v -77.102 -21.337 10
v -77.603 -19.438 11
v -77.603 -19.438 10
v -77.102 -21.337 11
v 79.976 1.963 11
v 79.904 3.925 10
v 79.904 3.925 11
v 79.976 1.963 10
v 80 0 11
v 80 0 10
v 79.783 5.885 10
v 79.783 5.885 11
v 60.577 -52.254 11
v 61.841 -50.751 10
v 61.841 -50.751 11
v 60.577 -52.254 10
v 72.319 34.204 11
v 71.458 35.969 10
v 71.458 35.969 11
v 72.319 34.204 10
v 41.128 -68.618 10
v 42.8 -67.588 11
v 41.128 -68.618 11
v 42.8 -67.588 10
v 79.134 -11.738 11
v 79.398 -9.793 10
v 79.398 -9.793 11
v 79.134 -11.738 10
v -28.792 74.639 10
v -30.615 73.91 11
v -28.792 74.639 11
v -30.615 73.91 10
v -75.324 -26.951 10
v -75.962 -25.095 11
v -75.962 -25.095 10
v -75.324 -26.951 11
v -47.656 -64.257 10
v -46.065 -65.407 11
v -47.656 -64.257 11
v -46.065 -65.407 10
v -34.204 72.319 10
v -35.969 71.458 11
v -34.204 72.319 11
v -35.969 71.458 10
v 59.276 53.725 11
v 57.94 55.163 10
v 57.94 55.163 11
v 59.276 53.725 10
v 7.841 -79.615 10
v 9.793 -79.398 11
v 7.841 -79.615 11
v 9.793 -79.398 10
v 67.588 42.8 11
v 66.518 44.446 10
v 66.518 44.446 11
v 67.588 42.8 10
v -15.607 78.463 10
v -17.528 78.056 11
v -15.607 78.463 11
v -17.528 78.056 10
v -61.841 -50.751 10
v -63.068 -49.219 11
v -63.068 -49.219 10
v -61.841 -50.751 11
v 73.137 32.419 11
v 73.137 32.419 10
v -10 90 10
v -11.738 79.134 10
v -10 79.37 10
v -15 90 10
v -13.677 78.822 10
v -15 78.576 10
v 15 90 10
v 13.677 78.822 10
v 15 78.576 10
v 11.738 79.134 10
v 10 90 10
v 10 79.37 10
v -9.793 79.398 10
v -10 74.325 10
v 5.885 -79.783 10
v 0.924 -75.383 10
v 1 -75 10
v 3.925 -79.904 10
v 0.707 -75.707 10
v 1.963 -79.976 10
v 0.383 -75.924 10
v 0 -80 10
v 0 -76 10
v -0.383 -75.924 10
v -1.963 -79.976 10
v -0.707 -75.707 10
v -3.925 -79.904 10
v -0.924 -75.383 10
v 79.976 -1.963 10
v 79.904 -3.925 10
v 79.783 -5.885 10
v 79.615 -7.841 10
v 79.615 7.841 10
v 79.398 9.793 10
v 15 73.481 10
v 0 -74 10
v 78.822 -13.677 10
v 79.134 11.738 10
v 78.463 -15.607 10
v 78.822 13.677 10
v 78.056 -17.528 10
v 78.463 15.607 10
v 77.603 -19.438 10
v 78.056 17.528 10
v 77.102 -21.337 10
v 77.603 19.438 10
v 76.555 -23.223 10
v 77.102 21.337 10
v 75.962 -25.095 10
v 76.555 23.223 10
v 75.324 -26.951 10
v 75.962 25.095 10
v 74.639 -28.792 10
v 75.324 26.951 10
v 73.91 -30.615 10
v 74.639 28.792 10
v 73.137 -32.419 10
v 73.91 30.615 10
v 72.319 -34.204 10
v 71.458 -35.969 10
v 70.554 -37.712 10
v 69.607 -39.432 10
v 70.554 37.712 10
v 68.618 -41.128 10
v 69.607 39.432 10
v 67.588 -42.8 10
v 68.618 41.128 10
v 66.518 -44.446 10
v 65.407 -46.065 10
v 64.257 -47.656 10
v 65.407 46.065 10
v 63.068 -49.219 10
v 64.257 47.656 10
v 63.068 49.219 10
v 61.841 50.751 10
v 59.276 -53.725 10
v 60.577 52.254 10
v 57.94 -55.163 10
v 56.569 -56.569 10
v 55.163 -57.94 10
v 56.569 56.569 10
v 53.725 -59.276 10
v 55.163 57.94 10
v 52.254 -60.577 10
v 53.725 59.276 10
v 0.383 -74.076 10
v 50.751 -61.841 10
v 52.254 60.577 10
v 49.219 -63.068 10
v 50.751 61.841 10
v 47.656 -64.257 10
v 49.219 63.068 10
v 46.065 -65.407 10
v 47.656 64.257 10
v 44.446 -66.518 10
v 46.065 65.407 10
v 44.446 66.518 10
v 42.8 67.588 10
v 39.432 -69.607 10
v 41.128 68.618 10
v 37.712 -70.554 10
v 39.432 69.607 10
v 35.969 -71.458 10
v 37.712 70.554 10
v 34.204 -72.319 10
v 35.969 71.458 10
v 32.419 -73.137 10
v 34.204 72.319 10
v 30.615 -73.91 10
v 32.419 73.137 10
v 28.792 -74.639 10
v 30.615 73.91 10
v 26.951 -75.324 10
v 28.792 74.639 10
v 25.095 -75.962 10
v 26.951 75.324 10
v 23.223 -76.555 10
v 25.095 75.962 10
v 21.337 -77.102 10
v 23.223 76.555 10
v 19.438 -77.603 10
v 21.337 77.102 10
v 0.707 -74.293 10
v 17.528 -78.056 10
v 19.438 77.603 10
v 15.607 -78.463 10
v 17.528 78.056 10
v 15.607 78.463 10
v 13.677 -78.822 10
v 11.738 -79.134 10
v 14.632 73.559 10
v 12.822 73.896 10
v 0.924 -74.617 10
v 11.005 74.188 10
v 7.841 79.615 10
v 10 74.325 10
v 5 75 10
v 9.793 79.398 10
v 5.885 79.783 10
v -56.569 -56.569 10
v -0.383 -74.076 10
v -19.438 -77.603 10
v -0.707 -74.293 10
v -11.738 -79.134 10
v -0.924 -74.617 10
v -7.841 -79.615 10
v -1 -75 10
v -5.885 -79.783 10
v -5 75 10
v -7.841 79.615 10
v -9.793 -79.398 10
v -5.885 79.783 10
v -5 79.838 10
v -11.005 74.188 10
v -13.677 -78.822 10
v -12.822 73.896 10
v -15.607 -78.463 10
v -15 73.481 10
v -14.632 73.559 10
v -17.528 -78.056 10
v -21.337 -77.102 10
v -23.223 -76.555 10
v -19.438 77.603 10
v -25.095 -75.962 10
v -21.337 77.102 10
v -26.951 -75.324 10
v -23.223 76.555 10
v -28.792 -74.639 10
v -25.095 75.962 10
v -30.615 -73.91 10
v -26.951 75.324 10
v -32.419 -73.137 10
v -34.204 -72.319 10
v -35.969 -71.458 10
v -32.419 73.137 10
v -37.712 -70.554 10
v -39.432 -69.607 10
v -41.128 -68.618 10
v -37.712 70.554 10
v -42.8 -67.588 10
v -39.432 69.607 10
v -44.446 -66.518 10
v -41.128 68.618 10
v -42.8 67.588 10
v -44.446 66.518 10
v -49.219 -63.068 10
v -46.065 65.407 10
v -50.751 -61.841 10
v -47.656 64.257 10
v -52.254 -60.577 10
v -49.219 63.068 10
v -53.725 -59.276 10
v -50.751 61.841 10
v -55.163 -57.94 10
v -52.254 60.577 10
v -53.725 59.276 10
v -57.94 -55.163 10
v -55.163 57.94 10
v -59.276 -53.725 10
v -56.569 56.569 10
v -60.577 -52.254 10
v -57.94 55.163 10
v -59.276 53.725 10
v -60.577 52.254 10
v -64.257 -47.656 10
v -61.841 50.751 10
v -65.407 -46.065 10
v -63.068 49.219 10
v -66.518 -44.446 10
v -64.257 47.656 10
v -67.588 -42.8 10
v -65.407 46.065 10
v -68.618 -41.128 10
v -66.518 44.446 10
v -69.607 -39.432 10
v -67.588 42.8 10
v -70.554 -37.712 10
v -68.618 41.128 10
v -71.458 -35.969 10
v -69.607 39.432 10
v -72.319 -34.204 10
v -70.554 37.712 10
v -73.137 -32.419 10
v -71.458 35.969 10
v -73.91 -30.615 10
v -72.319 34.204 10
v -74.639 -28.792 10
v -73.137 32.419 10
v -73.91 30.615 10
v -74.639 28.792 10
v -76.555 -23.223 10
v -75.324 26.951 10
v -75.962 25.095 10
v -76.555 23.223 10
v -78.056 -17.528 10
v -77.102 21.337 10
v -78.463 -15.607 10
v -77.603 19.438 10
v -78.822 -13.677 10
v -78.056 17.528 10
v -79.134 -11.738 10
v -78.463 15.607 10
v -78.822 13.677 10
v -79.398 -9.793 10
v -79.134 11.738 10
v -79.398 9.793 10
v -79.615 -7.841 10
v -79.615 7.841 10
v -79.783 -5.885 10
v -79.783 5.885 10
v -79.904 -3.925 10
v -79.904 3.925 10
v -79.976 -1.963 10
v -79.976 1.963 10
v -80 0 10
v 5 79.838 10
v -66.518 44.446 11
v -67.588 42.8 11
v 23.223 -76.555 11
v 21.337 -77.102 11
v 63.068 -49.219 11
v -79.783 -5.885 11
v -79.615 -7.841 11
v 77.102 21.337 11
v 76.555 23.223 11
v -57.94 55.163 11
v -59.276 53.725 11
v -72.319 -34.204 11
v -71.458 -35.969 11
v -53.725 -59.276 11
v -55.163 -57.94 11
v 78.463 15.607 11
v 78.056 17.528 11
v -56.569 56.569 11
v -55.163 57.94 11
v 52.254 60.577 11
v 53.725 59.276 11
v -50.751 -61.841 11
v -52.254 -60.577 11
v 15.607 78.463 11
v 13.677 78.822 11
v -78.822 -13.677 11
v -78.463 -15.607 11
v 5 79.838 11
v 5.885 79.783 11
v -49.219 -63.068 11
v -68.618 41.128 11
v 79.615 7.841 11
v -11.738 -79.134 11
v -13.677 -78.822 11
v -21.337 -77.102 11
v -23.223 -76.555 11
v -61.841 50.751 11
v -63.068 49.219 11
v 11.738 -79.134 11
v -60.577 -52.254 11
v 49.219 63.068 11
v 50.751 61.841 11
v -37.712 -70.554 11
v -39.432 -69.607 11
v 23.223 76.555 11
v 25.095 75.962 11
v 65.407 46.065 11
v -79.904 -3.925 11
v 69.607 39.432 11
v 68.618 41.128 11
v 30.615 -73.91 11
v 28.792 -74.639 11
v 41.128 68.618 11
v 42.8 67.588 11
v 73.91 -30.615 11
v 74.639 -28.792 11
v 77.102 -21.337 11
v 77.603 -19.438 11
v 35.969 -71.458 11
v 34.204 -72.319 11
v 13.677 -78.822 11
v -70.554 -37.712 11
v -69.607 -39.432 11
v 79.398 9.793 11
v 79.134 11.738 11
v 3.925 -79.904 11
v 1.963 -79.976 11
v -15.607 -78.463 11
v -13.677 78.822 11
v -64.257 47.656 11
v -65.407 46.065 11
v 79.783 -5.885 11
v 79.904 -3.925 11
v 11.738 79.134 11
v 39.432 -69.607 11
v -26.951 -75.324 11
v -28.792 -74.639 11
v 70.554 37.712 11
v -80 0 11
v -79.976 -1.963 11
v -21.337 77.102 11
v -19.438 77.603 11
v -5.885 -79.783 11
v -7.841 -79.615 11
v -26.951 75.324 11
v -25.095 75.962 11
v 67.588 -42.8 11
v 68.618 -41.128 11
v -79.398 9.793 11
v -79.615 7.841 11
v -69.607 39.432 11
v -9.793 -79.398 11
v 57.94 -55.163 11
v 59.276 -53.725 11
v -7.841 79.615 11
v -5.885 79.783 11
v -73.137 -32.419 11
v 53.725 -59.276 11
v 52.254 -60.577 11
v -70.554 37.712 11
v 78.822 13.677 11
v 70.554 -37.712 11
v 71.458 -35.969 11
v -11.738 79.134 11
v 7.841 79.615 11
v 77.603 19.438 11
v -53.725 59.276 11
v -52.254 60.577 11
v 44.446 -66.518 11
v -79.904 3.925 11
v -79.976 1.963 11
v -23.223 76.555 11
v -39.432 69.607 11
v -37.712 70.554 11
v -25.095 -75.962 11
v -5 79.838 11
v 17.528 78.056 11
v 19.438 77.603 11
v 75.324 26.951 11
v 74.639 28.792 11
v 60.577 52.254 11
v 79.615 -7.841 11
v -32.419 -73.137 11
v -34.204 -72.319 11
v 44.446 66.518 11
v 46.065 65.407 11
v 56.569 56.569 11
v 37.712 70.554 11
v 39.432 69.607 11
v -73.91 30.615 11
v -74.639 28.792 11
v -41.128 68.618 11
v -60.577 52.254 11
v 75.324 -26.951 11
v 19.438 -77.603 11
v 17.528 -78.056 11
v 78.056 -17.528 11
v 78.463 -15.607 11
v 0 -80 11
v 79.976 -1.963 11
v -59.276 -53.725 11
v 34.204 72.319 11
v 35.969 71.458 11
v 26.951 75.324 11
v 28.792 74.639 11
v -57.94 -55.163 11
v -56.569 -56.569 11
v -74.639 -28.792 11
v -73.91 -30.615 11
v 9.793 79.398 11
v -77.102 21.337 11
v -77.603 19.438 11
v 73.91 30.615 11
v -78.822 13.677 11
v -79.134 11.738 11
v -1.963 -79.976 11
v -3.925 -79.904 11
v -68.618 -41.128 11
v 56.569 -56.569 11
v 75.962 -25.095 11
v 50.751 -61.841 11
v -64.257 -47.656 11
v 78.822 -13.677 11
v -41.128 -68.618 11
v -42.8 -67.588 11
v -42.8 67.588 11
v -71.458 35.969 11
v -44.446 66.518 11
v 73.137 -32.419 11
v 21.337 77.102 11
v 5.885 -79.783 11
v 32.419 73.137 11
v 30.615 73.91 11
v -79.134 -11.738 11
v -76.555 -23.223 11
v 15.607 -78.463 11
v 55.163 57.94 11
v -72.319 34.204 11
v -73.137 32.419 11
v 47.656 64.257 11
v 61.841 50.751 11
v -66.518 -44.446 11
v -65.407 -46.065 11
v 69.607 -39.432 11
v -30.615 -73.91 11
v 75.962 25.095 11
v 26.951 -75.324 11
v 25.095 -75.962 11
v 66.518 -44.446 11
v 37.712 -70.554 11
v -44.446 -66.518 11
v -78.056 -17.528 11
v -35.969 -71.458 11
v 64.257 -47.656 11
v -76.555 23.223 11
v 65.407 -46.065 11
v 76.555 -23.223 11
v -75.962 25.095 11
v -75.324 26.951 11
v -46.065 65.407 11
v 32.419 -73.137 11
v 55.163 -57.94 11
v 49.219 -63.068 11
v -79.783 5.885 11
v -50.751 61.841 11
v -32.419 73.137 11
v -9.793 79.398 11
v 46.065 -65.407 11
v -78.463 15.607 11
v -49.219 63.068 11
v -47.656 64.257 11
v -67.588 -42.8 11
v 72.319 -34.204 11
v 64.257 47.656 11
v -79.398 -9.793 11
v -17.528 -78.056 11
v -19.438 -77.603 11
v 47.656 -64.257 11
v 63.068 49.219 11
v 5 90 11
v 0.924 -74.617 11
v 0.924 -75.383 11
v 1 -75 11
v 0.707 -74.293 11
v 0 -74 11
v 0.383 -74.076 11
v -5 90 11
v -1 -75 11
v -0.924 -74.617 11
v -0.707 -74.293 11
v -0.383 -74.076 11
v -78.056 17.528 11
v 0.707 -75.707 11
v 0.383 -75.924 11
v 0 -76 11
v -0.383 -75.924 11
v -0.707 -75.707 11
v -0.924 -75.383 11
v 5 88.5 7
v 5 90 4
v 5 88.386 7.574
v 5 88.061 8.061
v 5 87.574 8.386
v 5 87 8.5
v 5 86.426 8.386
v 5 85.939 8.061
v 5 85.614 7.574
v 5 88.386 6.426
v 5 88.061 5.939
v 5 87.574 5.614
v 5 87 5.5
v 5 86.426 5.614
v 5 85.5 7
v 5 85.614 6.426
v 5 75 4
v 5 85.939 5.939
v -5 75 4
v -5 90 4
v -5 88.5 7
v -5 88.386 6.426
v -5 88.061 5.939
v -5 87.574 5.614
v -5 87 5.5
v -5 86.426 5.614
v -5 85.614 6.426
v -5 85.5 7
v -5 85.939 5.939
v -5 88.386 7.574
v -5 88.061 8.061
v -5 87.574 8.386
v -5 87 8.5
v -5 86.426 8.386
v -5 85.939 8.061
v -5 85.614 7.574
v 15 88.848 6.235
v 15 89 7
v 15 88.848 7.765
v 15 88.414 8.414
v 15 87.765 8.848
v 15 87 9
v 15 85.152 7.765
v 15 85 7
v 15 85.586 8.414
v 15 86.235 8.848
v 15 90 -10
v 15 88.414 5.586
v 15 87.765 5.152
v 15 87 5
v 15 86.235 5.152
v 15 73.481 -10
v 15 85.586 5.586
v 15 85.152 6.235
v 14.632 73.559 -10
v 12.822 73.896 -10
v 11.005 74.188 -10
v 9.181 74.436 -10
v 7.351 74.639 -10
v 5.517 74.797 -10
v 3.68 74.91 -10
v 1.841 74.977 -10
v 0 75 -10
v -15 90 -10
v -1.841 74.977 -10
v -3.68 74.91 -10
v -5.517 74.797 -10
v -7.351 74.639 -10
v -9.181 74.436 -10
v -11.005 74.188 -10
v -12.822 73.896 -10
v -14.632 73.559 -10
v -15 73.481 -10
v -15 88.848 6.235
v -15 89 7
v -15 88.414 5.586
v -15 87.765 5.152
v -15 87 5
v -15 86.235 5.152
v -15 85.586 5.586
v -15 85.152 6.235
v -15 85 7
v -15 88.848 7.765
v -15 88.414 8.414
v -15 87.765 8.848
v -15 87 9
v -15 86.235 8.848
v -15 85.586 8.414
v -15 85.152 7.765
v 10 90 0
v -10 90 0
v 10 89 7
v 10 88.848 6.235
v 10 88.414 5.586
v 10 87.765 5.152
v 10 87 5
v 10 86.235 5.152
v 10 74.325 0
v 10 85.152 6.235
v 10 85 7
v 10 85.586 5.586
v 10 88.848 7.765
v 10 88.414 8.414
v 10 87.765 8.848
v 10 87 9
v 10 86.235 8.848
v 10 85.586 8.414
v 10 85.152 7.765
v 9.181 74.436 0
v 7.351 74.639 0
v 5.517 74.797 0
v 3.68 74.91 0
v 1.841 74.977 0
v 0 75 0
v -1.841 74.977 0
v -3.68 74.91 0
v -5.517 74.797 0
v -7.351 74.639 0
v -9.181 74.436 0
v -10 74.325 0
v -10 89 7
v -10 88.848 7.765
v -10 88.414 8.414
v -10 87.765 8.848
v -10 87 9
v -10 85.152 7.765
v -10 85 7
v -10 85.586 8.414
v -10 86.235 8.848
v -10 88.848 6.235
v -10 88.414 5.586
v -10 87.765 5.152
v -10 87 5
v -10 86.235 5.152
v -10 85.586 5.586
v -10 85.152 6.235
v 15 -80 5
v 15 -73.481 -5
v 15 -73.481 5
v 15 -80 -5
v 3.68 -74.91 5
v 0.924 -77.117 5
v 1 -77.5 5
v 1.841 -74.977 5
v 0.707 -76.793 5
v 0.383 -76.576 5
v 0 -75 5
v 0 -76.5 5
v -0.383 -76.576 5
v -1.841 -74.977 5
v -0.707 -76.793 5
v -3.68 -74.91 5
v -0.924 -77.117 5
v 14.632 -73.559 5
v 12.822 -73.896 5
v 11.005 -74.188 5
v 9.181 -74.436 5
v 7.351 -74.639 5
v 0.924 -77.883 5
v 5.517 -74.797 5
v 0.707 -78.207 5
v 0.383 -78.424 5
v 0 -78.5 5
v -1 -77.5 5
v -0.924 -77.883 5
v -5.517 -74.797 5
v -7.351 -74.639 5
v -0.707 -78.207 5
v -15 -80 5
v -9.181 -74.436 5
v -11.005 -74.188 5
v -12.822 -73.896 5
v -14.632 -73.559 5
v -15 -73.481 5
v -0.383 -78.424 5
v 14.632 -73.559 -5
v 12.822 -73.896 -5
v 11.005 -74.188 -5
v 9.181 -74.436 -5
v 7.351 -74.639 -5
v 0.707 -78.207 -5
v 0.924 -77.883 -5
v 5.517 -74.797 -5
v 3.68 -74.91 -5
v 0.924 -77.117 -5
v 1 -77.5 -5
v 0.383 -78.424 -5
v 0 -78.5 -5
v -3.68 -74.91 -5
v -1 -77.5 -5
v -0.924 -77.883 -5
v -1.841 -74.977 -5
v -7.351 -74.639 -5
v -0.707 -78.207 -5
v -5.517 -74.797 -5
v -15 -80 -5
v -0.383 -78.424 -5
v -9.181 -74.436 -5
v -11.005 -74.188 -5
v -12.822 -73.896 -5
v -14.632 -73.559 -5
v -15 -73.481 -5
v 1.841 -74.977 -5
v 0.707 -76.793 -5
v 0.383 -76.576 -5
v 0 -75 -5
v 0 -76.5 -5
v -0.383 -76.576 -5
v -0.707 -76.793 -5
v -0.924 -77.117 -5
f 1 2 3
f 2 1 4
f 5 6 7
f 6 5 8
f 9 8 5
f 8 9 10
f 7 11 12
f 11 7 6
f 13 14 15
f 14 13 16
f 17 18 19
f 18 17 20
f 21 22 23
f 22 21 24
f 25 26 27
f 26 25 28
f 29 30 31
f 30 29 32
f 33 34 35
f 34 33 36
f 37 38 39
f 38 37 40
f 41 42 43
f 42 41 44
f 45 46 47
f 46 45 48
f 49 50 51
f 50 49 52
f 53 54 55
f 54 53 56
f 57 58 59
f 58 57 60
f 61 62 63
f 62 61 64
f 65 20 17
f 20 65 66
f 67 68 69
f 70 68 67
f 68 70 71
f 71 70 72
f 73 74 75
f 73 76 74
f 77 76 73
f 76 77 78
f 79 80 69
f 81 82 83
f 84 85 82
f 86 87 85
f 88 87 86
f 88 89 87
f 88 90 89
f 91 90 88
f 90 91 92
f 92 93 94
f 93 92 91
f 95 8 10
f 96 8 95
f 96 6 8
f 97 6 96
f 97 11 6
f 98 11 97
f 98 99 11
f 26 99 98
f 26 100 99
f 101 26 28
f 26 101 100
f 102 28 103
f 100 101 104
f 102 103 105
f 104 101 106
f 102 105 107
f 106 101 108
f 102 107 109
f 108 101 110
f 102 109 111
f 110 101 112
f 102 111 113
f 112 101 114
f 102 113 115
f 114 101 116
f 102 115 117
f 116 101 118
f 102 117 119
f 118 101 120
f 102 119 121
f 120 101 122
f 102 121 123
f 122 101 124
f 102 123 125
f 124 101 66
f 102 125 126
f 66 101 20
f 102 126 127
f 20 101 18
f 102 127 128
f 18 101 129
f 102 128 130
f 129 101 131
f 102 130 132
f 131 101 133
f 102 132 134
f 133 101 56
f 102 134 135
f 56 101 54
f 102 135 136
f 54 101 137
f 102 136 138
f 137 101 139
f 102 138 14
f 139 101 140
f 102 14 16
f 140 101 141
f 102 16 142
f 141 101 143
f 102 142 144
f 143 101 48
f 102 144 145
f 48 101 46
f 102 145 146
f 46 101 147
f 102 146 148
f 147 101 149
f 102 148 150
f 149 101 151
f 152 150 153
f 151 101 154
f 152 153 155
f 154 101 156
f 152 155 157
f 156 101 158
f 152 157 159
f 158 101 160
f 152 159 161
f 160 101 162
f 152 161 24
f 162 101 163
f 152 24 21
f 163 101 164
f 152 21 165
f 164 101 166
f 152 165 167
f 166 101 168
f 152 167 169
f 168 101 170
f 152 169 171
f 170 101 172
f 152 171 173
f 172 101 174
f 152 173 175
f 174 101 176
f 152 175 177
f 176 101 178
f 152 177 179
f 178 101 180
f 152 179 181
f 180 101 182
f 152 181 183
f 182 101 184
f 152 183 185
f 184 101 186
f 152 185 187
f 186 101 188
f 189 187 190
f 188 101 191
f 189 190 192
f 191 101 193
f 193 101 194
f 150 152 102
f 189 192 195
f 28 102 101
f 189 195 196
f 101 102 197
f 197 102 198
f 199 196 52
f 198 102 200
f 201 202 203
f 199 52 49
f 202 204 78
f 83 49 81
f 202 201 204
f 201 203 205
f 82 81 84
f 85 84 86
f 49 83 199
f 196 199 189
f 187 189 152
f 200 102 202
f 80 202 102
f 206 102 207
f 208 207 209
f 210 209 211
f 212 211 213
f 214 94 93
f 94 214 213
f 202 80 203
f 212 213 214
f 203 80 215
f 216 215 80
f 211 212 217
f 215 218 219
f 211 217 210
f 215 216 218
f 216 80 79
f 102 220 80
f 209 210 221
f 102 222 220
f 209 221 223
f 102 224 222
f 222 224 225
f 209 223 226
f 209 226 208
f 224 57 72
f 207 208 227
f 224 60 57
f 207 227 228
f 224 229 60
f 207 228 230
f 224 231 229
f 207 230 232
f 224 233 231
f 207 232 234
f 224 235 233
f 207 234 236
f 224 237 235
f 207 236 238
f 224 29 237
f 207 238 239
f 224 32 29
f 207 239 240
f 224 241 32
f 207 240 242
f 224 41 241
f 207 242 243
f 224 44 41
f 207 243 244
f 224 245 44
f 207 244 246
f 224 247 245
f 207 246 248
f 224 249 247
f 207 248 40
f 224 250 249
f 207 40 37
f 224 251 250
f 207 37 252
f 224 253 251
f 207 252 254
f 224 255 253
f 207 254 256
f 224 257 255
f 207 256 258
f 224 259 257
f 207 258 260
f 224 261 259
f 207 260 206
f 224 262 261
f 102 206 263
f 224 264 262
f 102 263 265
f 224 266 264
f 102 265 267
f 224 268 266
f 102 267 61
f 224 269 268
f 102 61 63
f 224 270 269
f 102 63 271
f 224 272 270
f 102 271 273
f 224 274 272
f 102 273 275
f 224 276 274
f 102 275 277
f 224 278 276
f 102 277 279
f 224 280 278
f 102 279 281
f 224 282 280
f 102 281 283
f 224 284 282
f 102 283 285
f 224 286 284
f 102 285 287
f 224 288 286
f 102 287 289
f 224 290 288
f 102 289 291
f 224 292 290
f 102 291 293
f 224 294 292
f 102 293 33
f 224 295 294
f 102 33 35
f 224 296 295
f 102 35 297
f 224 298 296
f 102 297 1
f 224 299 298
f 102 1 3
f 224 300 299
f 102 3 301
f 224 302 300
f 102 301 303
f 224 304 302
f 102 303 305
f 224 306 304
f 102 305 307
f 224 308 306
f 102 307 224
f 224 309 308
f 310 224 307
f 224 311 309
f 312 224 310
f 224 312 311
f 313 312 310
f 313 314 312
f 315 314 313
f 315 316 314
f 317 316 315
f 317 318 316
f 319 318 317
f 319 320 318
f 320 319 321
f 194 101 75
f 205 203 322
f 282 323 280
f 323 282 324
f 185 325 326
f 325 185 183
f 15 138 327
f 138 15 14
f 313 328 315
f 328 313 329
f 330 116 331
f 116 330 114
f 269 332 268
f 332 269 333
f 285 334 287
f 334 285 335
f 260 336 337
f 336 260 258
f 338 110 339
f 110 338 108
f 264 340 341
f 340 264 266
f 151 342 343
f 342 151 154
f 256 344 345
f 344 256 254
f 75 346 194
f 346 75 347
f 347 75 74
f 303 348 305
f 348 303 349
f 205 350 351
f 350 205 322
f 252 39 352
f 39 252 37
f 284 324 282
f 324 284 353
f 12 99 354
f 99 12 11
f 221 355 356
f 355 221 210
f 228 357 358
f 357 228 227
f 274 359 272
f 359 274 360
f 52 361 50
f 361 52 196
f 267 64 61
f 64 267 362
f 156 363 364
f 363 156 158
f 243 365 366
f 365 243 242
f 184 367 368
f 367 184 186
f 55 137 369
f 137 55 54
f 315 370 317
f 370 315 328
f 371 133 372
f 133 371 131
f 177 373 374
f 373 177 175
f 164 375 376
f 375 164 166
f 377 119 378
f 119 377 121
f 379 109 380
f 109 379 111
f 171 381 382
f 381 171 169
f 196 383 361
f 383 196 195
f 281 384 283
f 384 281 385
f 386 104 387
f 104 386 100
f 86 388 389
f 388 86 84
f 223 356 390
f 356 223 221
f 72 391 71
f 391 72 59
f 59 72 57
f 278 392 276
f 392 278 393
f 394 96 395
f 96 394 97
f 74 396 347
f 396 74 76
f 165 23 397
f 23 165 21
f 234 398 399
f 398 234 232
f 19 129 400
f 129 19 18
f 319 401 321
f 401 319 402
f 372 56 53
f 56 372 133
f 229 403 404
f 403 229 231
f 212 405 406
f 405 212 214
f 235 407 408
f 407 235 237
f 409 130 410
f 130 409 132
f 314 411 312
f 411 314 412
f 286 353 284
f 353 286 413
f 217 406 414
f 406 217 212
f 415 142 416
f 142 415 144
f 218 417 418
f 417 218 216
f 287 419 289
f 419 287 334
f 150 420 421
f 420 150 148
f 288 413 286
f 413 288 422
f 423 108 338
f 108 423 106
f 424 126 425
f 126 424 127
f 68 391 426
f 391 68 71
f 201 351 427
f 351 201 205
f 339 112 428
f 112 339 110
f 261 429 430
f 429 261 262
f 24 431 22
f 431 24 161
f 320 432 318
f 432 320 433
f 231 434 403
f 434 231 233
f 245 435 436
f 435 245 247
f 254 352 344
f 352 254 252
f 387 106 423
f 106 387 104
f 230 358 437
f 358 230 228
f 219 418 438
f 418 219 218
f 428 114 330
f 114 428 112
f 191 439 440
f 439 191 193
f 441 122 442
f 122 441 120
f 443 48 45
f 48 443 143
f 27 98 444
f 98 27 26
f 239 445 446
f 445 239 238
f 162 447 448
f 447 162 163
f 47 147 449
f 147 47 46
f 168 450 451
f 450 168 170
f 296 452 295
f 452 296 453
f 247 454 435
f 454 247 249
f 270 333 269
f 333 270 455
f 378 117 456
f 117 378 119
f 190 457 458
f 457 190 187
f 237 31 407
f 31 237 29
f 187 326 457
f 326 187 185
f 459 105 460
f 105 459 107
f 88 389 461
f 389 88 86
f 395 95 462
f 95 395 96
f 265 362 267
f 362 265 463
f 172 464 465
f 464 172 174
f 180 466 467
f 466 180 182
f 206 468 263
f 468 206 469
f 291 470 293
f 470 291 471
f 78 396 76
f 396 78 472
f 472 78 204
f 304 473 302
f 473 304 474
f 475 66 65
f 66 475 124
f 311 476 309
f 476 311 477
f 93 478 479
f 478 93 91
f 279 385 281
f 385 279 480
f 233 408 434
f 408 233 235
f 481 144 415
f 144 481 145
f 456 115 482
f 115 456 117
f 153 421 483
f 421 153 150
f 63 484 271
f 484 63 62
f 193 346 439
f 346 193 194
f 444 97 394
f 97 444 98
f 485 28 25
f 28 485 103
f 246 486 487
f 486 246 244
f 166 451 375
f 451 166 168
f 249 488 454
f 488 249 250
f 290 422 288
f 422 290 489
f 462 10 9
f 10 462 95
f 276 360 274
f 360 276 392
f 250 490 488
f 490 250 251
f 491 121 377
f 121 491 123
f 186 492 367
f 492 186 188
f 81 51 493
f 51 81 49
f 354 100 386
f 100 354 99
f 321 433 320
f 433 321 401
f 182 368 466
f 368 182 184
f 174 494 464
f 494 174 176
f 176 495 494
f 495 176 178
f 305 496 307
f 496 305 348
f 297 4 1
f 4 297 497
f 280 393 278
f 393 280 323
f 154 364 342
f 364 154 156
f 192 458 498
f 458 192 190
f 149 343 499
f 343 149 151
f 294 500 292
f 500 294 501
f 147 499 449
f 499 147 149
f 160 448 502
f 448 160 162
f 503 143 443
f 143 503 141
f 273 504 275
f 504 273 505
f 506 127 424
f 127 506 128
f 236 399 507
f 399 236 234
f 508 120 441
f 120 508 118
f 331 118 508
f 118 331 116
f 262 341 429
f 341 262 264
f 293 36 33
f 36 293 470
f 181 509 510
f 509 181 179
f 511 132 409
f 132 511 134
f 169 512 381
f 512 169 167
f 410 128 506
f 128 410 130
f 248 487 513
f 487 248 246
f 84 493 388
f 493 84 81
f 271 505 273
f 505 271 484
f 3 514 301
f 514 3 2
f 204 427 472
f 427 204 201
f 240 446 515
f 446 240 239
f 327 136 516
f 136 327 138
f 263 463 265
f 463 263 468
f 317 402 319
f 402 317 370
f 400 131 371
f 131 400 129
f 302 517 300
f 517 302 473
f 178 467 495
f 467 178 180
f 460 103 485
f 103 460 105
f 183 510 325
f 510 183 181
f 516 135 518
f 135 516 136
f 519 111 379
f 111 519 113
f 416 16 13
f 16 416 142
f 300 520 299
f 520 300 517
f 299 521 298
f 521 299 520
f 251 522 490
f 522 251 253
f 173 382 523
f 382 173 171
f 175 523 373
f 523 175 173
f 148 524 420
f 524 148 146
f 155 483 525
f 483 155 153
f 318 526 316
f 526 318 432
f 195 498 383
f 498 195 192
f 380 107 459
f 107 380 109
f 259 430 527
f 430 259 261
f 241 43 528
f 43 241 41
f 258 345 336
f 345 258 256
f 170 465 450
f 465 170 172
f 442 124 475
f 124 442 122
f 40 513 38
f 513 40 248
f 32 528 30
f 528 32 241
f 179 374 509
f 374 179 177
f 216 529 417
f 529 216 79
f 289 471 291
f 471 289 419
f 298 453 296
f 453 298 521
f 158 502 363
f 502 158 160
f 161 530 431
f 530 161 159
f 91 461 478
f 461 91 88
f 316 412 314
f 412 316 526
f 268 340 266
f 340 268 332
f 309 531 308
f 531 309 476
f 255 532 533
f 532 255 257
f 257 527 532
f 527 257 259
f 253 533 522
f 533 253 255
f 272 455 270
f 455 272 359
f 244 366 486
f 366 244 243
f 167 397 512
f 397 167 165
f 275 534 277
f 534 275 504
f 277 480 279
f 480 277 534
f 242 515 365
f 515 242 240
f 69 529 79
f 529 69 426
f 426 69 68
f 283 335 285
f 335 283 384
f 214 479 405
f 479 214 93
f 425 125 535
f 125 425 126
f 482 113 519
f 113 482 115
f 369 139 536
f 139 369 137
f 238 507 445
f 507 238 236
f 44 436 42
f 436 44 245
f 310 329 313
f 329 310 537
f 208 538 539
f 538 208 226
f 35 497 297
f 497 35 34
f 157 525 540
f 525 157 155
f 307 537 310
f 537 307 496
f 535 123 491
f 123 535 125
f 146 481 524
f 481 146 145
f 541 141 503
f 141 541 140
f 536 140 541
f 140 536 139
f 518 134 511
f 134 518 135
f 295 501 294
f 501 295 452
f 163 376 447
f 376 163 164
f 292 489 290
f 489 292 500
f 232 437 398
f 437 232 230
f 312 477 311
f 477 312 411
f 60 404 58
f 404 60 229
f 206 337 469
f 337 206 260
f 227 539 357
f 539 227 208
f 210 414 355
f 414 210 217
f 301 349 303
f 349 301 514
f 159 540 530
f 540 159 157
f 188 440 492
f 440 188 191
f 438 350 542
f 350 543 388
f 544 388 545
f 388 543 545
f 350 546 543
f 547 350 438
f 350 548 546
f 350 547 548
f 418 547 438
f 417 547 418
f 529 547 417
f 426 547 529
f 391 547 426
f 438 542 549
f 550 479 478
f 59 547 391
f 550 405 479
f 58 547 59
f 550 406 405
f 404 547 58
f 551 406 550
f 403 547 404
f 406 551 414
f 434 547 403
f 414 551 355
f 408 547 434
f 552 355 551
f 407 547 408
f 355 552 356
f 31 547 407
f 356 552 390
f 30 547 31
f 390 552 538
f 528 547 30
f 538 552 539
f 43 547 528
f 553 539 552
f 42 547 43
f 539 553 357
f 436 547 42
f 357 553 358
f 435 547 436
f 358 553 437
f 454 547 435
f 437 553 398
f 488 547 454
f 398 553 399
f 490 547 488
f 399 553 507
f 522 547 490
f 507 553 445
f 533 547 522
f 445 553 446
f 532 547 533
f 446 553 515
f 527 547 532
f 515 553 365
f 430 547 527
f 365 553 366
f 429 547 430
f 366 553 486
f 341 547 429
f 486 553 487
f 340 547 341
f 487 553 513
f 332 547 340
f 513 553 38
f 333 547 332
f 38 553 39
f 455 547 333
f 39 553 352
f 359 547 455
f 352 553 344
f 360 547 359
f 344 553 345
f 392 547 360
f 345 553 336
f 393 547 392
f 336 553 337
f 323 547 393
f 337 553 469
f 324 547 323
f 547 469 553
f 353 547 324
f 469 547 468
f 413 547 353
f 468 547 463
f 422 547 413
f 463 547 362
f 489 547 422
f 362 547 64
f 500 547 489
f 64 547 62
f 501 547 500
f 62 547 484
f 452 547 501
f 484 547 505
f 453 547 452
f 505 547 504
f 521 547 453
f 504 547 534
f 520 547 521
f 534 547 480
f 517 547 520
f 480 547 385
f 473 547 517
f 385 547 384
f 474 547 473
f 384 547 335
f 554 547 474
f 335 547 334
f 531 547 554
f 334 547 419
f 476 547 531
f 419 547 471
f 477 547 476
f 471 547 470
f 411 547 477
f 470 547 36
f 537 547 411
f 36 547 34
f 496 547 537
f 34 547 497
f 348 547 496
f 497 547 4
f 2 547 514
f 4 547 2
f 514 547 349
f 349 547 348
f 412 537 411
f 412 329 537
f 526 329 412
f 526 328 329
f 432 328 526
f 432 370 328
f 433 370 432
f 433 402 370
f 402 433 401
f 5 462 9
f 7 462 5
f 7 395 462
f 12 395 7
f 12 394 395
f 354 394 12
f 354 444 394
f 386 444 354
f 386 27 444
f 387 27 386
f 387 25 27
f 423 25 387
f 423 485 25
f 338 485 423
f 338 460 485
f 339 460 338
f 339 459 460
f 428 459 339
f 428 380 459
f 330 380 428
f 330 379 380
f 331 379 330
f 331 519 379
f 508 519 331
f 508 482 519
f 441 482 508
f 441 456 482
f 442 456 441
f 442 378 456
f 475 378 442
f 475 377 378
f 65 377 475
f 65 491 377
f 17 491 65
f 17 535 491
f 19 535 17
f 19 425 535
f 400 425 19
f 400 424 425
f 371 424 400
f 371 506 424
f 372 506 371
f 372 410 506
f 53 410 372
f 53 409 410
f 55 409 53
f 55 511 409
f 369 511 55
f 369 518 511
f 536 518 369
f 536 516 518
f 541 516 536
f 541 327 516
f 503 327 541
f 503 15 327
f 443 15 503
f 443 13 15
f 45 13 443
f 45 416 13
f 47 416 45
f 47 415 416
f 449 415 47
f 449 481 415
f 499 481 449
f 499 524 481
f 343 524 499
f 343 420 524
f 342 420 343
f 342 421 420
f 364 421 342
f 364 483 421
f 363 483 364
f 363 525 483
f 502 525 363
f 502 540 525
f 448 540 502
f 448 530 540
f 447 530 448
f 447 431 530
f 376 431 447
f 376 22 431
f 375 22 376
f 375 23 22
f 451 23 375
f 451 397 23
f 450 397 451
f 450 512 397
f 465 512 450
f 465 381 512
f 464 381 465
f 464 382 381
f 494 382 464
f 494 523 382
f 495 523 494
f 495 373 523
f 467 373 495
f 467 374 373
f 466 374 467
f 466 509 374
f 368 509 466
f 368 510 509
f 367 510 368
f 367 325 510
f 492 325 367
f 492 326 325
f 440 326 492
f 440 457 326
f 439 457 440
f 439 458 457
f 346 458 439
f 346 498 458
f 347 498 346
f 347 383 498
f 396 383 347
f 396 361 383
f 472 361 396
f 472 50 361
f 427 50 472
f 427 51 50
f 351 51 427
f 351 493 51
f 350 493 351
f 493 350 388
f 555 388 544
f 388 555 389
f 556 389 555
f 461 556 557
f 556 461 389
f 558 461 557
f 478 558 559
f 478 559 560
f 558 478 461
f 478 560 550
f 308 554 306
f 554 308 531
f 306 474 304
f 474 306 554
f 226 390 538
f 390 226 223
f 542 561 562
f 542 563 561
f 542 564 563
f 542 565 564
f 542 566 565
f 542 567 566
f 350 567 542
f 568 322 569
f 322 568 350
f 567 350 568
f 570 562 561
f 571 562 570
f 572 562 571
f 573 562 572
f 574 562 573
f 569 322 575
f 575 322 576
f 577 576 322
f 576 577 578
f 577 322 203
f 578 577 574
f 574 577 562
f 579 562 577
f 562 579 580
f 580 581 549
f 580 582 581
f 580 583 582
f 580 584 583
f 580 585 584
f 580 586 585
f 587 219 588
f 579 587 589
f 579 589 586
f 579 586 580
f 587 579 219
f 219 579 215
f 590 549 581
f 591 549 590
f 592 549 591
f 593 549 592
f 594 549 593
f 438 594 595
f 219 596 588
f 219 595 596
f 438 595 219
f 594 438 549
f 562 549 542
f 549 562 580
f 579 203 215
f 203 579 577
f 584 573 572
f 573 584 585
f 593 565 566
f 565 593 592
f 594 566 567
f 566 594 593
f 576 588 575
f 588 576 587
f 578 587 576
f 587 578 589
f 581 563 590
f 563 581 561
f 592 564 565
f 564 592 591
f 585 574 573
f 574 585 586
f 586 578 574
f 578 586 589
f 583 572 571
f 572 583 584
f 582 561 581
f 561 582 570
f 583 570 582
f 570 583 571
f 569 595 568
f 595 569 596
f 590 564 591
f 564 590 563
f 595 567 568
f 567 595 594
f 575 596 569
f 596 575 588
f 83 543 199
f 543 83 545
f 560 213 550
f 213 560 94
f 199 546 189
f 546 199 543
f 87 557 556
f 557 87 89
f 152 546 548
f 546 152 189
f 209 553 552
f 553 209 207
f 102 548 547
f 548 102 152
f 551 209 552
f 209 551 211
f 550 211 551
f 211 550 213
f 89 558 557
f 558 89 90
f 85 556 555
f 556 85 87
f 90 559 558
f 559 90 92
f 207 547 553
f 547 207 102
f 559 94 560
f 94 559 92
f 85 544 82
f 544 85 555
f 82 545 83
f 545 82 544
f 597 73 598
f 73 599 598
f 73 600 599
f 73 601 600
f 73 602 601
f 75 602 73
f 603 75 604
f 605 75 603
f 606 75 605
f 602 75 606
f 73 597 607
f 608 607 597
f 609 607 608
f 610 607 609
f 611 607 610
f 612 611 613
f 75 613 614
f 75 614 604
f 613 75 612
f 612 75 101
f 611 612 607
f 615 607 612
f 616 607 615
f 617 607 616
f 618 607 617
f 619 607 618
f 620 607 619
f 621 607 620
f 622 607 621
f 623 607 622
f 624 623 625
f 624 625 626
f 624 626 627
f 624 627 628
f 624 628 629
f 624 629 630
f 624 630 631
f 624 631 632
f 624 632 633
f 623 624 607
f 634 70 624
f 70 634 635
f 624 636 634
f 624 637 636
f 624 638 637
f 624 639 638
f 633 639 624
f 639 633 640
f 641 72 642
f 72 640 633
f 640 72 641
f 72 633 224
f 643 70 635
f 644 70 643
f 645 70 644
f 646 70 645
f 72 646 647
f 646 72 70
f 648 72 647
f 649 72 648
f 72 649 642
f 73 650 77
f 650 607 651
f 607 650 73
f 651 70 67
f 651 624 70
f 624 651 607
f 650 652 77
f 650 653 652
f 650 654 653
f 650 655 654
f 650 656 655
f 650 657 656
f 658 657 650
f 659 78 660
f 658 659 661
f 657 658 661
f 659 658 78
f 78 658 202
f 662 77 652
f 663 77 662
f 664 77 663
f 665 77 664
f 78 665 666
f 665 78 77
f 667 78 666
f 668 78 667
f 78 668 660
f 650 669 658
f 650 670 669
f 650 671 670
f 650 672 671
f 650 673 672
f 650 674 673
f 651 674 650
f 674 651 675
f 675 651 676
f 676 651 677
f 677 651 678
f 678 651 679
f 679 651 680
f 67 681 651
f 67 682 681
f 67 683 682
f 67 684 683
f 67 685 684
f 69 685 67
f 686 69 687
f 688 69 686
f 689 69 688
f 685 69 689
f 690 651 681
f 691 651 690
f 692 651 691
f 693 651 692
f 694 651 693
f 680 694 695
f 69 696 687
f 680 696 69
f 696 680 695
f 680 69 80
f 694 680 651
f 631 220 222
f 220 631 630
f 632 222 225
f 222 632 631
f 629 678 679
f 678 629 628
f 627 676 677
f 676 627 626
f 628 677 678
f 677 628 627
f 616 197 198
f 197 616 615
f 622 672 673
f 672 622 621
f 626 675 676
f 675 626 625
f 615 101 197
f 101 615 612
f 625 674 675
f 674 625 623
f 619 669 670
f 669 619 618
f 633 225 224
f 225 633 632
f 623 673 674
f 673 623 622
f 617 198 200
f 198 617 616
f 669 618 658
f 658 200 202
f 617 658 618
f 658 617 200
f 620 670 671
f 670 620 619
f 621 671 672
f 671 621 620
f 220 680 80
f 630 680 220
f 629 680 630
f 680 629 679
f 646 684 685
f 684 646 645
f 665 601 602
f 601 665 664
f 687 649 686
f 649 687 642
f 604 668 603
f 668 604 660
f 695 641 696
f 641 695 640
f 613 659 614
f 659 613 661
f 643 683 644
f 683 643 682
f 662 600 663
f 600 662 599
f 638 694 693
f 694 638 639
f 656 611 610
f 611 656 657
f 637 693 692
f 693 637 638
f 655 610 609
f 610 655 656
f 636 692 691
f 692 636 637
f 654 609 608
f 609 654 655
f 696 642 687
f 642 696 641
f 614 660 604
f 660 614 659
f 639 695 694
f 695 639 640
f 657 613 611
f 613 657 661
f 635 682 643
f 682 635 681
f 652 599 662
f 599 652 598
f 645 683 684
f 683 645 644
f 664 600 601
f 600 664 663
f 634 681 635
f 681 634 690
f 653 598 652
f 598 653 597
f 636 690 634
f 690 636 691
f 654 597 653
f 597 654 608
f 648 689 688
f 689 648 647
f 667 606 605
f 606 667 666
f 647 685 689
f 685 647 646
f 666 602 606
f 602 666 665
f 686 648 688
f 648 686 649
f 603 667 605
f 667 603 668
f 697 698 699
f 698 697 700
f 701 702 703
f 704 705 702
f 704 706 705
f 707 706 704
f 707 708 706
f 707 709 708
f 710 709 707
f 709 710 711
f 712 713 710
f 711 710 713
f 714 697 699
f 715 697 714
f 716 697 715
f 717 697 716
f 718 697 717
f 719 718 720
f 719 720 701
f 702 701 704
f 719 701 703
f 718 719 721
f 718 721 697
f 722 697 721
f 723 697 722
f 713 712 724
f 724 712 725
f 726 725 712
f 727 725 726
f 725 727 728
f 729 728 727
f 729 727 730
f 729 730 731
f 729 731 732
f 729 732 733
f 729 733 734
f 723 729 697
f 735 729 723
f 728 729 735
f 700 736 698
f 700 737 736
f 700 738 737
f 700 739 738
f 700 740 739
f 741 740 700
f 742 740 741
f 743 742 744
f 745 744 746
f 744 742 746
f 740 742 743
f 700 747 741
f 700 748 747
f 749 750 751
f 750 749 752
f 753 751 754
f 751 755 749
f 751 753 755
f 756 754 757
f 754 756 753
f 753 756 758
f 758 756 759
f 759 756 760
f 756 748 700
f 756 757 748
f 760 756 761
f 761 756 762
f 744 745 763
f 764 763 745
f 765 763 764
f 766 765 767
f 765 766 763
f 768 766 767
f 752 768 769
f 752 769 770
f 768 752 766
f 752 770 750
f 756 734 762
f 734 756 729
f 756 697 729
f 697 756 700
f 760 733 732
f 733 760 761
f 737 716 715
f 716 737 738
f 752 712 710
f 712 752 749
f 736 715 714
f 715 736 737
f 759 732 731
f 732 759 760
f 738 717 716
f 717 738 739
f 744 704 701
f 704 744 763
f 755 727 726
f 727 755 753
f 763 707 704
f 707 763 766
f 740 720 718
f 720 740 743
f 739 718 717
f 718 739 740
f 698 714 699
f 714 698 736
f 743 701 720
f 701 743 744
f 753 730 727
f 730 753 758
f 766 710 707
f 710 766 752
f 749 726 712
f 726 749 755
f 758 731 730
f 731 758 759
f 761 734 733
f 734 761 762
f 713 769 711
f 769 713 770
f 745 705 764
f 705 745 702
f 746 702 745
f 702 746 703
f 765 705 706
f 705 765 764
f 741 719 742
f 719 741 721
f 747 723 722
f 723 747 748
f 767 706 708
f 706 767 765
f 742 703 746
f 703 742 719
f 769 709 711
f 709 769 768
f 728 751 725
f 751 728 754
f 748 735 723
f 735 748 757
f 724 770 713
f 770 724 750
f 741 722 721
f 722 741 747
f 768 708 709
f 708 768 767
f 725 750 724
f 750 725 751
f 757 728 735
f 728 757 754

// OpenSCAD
$fn=256;


difference(){
union(){
translate([0,0,10])
cylinder(d=160,h=1);
translate([0,82.5,7.5])
cube([10,15,7],center=true);
}
translate([0,87,7])
rotate([0,90,0])
cylinder(d=3,h=50,center=true,$fn=16);
    translate([0,-80+5,0])
cylinder(d=2,h=50,center=true,$fn=16);
}

difference(){
translate([0,80,0])
cube([30,20,20],center=true);
translate([0,80,10])
cube([20,25,20],center=true);
cylinder(d=150,h=50,center=true);
    translate([0,87,7])
rotate([0,90,0])
cylinder(d=4,h=50,center=true,$fn=16);

}


difference(){
translate([0,-75,0])
cube([30,10,10],center=true);
translate([0,80,10])
cube([20,25,20],center=true);
cylinder(d=150,h=50,center=true);
        translate([0,-80+2.5,0])
cylinder(d=2,h=50,center=true,$fn=16);
}
